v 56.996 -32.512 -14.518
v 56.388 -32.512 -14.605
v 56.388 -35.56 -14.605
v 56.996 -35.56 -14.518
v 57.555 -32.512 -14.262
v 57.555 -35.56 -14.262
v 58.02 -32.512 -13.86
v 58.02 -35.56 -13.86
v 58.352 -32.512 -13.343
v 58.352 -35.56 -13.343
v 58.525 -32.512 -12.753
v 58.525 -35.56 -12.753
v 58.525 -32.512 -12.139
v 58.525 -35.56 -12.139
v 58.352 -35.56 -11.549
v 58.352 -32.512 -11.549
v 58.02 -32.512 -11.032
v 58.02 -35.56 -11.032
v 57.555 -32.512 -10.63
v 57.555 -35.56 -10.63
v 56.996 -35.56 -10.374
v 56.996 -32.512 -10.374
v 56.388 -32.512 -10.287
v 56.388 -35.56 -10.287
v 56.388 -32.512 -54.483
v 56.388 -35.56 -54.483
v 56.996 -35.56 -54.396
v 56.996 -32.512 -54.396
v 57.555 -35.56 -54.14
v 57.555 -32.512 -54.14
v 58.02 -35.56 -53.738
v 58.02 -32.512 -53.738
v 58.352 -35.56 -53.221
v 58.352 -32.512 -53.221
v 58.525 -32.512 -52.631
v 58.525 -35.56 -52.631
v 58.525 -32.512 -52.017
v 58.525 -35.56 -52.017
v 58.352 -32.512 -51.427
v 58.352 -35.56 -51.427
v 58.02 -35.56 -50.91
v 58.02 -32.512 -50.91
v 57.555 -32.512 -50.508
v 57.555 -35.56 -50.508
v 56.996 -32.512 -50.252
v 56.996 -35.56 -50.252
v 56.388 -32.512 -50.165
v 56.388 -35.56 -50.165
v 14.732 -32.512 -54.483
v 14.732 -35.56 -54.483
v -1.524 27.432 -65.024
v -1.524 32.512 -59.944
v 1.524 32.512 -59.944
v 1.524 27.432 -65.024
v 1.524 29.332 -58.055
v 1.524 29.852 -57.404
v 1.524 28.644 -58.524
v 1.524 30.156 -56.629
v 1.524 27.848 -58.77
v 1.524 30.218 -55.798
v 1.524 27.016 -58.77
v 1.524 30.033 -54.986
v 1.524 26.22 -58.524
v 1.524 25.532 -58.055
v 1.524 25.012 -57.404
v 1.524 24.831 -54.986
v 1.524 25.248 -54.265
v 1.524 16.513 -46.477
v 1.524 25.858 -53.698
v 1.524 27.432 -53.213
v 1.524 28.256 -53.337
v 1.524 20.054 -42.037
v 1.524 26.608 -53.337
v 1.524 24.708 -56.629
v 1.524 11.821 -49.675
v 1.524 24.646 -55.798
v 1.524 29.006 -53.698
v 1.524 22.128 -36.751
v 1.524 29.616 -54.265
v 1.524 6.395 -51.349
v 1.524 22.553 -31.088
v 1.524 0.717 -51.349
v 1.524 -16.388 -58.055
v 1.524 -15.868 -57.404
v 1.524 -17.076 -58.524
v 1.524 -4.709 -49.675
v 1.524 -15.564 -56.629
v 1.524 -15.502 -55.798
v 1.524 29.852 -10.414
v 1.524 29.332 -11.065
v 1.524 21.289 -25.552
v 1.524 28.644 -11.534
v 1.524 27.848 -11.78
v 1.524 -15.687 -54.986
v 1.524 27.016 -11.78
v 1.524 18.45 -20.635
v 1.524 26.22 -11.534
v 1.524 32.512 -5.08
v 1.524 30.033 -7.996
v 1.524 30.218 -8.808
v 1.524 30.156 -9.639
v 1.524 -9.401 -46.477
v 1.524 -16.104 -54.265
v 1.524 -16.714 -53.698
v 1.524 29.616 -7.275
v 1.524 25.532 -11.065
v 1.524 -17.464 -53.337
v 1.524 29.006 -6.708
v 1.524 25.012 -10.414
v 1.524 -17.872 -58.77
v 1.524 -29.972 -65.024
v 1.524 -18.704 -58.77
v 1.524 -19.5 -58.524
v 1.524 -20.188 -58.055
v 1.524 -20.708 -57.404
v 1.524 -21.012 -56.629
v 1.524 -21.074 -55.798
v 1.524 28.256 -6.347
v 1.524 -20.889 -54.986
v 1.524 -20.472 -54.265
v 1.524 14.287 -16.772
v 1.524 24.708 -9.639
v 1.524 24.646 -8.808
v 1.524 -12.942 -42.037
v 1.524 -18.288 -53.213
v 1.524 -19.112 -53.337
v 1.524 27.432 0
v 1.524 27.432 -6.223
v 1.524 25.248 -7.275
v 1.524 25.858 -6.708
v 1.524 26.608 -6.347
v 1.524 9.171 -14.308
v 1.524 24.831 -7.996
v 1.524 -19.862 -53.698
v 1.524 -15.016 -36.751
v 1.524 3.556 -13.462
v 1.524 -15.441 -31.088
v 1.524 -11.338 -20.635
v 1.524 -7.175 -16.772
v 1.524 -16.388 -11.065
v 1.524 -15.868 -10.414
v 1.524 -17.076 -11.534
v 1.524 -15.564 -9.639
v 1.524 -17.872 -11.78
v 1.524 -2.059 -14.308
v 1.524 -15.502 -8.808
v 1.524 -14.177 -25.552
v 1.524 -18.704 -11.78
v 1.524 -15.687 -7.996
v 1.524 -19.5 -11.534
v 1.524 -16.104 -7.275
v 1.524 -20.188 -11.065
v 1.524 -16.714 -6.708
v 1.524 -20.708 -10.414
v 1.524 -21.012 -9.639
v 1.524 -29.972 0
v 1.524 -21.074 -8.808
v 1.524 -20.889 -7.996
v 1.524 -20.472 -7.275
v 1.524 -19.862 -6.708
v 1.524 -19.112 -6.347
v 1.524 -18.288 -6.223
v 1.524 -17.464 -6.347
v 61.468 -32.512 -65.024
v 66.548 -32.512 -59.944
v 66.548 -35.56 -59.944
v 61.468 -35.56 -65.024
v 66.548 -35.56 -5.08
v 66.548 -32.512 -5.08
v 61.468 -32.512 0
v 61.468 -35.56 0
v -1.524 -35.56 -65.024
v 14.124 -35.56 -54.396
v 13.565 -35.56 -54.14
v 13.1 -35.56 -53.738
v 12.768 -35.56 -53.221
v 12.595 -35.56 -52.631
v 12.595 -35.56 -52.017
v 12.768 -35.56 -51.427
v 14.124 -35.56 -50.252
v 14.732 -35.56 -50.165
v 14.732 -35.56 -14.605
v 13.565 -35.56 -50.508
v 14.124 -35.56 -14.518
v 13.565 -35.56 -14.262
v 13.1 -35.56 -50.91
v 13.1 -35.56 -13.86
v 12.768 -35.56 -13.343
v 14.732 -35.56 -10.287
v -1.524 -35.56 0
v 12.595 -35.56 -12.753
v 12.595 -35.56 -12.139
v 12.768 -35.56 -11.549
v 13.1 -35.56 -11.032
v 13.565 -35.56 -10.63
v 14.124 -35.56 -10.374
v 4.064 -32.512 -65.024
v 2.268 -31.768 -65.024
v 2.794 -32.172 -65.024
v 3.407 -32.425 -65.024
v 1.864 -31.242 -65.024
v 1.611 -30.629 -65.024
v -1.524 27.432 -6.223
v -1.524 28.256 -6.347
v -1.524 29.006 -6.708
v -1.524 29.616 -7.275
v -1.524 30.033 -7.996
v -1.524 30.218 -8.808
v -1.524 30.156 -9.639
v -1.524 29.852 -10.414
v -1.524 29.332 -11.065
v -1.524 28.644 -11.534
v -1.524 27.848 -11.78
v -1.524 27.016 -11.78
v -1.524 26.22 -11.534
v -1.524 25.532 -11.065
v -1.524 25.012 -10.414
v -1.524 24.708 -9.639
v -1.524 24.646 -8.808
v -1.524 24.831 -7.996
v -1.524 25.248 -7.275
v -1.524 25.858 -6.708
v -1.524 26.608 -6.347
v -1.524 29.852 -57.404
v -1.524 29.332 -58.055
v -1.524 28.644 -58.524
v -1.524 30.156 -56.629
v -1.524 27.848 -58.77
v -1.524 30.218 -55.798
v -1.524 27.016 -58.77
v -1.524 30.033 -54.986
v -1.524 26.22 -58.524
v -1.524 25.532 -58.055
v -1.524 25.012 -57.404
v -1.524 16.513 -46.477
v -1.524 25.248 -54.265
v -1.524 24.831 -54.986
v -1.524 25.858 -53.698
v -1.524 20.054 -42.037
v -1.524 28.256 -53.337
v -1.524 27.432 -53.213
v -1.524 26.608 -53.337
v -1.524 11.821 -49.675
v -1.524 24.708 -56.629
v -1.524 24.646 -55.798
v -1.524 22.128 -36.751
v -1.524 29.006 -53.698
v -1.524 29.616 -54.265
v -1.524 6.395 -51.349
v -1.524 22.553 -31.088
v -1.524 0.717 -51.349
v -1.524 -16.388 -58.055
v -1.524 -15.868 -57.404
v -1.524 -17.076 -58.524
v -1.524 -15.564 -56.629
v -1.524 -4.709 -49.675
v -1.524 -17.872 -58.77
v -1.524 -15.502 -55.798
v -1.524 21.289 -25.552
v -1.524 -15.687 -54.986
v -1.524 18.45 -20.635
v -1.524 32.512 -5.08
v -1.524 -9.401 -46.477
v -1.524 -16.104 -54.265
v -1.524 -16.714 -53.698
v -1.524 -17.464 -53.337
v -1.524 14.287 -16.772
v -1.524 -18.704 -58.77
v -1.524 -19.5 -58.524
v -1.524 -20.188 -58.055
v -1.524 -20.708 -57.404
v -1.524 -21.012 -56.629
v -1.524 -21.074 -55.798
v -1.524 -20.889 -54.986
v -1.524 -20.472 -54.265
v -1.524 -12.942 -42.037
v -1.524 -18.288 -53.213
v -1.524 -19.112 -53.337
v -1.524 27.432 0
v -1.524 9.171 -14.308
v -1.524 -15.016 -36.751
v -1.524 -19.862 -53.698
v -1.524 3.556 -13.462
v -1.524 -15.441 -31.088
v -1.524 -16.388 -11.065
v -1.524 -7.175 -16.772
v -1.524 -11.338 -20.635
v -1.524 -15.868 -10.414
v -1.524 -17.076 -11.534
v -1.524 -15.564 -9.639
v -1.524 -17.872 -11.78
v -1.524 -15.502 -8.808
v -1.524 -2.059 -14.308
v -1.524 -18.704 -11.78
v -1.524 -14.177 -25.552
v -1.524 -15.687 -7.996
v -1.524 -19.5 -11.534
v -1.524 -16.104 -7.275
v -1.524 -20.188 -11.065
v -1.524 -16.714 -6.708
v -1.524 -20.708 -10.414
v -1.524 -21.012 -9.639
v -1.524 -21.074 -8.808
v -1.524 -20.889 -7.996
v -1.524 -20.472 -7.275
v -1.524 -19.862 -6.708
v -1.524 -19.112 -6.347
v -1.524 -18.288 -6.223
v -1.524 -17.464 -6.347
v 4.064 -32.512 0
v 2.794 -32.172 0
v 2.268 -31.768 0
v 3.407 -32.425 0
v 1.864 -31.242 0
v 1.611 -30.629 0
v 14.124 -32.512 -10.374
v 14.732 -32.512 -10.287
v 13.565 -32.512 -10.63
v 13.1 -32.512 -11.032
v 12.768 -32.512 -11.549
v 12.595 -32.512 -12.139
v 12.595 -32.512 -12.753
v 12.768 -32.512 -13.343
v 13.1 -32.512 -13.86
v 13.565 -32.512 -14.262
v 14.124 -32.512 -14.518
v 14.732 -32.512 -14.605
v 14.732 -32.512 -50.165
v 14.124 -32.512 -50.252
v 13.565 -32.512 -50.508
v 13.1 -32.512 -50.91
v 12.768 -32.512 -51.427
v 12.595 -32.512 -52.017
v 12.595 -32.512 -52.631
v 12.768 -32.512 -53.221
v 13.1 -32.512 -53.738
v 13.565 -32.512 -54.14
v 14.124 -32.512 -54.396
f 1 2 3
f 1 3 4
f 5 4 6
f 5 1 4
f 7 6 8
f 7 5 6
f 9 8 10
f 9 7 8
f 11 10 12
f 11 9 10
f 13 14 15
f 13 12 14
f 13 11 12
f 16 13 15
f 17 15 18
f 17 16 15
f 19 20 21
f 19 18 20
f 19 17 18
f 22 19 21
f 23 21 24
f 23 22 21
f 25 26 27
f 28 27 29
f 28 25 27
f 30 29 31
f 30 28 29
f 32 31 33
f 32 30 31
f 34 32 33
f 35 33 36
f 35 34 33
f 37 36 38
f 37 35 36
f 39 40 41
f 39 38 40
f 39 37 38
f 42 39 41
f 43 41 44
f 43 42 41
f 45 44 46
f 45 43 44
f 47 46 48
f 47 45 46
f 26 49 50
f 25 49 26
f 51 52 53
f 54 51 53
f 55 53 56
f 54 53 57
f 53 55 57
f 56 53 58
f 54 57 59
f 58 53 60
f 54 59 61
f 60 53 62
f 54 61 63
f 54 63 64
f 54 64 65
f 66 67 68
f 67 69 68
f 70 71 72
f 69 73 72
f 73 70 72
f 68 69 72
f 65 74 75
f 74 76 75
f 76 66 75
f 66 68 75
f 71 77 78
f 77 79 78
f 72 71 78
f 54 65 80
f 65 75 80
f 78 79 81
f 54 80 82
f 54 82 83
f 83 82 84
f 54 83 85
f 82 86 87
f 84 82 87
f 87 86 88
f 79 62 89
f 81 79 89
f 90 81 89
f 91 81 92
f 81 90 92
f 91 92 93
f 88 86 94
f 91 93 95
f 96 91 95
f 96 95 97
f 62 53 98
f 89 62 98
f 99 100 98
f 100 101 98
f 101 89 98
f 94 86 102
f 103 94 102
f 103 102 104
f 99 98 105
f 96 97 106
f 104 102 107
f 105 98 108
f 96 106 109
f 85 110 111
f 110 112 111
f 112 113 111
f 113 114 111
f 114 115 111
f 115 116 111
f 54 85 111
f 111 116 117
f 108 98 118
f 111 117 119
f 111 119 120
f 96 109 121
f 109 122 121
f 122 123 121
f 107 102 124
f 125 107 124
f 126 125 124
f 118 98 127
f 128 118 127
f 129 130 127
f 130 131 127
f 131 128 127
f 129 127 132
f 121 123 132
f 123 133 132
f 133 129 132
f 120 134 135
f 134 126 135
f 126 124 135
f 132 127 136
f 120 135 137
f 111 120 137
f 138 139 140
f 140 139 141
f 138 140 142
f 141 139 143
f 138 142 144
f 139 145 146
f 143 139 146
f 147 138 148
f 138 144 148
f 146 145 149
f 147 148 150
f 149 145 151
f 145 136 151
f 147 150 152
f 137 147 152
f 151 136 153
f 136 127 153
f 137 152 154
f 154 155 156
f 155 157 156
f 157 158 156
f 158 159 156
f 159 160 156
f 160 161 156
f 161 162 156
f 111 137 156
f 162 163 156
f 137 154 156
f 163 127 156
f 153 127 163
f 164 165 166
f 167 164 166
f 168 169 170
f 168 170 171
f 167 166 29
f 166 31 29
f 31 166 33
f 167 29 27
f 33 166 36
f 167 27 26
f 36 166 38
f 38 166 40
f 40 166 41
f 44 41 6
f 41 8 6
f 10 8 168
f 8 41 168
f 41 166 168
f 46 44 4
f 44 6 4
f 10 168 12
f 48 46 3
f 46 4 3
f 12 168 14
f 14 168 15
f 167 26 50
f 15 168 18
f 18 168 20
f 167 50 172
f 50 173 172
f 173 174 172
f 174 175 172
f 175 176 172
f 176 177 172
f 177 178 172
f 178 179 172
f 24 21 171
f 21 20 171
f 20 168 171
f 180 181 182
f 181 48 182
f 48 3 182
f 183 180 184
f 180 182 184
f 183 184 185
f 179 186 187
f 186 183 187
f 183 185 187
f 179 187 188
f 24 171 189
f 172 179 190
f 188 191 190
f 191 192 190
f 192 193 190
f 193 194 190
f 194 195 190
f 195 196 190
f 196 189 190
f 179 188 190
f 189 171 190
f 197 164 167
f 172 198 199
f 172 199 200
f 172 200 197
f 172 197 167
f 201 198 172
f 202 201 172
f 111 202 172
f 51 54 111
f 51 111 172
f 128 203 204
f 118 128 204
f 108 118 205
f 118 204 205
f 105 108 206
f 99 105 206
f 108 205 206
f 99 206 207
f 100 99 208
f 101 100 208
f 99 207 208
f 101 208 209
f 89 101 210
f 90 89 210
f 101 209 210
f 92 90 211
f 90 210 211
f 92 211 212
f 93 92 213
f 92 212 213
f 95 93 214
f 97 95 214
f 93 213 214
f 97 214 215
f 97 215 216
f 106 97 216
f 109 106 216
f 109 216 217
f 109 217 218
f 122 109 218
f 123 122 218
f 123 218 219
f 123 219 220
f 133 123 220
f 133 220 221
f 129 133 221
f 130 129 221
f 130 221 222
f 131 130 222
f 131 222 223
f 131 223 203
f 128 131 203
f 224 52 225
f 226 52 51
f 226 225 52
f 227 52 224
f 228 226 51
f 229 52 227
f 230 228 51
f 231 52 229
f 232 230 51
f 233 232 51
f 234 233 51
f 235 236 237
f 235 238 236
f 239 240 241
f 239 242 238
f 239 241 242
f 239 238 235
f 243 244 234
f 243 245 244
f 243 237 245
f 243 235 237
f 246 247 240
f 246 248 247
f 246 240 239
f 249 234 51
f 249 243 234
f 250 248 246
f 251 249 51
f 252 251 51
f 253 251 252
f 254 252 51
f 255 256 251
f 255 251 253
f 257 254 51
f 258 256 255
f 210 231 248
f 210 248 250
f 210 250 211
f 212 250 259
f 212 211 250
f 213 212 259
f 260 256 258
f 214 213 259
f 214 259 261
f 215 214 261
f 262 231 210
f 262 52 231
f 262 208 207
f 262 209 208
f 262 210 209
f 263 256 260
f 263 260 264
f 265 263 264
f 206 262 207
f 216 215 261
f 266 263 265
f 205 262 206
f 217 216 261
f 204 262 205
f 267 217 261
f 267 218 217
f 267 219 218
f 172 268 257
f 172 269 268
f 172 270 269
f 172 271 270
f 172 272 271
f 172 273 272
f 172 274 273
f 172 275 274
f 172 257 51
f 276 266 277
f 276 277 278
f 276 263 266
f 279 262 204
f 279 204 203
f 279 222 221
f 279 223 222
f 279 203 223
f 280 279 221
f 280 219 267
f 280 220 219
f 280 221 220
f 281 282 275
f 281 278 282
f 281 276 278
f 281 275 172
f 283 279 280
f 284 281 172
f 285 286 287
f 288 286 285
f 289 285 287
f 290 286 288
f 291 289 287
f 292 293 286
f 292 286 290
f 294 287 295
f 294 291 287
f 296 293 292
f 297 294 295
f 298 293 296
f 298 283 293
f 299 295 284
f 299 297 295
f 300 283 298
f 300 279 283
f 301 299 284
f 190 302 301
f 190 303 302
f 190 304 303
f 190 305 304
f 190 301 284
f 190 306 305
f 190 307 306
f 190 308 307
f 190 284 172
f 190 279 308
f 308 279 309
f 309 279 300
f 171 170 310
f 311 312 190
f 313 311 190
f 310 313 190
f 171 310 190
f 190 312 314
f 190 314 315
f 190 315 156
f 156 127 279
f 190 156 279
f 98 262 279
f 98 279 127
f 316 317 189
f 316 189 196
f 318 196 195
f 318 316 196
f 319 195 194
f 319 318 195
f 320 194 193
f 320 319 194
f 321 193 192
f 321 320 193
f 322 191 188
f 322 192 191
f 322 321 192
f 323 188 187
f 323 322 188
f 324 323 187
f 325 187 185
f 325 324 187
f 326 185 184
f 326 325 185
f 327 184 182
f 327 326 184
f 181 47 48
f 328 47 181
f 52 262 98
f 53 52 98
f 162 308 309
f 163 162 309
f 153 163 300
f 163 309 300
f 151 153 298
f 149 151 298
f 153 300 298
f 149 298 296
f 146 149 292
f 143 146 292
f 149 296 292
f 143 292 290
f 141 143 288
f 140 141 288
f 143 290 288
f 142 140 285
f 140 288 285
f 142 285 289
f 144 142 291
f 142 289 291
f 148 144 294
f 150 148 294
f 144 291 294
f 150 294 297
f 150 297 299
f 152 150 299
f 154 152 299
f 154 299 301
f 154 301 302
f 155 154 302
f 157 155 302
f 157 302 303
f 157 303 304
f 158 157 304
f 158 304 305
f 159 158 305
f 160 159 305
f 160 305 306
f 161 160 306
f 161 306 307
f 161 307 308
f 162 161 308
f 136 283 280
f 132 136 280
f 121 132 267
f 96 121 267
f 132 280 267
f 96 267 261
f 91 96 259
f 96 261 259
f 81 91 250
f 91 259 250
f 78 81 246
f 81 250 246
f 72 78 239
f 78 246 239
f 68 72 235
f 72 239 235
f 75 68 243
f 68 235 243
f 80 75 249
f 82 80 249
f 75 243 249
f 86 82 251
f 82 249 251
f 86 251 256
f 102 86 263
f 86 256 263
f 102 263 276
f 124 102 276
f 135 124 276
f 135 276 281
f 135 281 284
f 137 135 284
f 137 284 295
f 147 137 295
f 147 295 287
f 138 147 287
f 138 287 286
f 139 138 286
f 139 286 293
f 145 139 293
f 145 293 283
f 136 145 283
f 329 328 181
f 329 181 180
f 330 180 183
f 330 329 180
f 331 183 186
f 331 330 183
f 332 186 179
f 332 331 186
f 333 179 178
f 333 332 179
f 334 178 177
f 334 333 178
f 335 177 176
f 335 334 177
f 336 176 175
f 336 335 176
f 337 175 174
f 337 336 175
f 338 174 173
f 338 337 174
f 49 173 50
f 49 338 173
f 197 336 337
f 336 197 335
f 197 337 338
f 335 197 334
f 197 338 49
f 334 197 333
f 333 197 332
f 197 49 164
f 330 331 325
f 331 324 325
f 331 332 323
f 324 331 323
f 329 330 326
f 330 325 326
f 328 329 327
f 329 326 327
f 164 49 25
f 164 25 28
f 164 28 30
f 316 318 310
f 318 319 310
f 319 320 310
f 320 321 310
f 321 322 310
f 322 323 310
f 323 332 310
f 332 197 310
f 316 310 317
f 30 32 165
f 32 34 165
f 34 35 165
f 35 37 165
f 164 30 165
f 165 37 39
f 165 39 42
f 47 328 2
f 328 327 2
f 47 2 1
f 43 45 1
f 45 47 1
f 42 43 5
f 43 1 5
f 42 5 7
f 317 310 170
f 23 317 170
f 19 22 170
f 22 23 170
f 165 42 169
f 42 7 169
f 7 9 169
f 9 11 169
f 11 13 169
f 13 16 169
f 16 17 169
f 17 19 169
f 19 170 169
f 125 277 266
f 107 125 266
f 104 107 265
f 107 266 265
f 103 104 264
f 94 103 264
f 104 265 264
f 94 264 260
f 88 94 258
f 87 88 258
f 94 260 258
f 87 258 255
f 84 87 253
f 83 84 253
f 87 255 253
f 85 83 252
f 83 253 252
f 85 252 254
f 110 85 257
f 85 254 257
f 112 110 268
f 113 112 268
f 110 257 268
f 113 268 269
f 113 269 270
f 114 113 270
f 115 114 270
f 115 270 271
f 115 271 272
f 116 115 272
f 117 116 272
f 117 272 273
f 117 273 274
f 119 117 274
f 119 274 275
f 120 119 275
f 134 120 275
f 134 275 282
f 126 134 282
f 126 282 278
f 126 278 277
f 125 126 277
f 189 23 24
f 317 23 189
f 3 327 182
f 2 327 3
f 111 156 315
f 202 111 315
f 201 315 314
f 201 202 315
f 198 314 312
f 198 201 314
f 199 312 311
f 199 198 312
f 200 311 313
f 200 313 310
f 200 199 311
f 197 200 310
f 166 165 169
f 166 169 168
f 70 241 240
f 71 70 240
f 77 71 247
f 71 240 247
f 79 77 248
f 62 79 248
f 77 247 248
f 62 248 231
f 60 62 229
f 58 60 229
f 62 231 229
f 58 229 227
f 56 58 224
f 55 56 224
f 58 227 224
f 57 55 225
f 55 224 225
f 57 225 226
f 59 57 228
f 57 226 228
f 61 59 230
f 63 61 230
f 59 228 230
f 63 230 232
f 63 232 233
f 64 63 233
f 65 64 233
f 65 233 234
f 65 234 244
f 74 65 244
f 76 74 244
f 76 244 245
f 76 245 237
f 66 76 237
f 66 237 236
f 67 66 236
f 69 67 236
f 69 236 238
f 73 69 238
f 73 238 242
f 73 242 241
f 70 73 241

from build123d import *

# Parameters (mm, degrees)
BOSS_EXTRUDE1_DEPTH = 65.024
CUT_EXTRUDE1_DEPTH  = 65.024
SKETCH3_R           = 19.05
SKETCH3_R_2         = 2.794
CUT_EXTRUDE2_DEPTH  = 65.024
FILLET1_R           = 2.54
CHAMFER1_SIZE       = 5.08


with BuildPart() as part:
    # Sketch1 → Boss-Extrude1 (new body)
    with BuildSketch(Plane.XY):
        Polygon((-1.524, 32.512), (1.524, 32.512), (1.524, -32.512), (66.548, -32.512), (66.548, -35.56), (-1.524, -35.56), (-1.524, -32.512), align=None)
    extrude(amount=-BOSS_EXTRUDE1_DEPTH)

    # Sketch2 → Cut-Extrude1 (cut)
    with BuildSketch(Plane(origin=(0, -32.512, 0), x_dir=(1, 0, 0), z_dir=(0, 1, 0))):
        with BuildLine():
            Line((14.732, 14.605), (56.388, 14.605))
            ThreePointArc((56.388, 14.605), (58.547, 12.446), (56.388, 10.287))
            Line((56.388, 10.287), (14.732, 10.287))
            ThreePointArc((14.732, 10.287), (12.573, 12.446), (14.732, 14.605))
        make_face()
        with BuildLine():
            Line((14.732, 54.483), (56.388, 54.483))
            ThreePointArc((56.388, 54.483), (58.547, 52.324), (56.388, 50.165))
            Line((56.388, 50.165), (14.732, 50.165))
            ThreePointArc((14.732, 50.165), (12.573, 52.324), (14.732, 54.483))
        make_face()
    extrude(amount=-CUT_EXTRUDE1_DEPTH, mode=Mode.SUBTRACT)

    # Sketch3 → Cut-Extrude2 (cut)
    with BuildSketch(Plane.ZY.offset(1.524)):
        with Locations((-32.512, 3.556)):
            Circle(SKETCH3_R)
        with Locations((-56.007, -18.288)):
            Circle(SKETCH3_R_2)
        with Locations((-9.017, -18.288)):
            Circle(SKETCH3_R_2)
        with Locations((-9.017, 27.432)):
            Circle(SKETCH3_R_2)
        with Locations((-56.007, 27.432)):
            Circle(SKETCH3_R_2)
    extrude(amount=-CUT_EXTRUDE2_DEPTH, mode=Mode.SUBTRACT)

    # Fillet1
    fillet1_edges = [part.edges().sort_by_distance(p)[0] for p in [
        (1.524, -32.512, -32.512),
    ]]
    fillet(fillet1_edges, radius=FILLET1_R)

    # Chamfer1
    chamfer1_edges = [part.edges().sort_by_distance(p)[0] for p in [
        (0, 32.512, -65.024),
        (66.548, -34.036, -65.024),
        (66.548, -34.036, 0),
        (0, 32.512, 0),
    ]]
    chamfer(chamfer1_edges, length=CHAMFER1_SIZE)


solid = part.part
